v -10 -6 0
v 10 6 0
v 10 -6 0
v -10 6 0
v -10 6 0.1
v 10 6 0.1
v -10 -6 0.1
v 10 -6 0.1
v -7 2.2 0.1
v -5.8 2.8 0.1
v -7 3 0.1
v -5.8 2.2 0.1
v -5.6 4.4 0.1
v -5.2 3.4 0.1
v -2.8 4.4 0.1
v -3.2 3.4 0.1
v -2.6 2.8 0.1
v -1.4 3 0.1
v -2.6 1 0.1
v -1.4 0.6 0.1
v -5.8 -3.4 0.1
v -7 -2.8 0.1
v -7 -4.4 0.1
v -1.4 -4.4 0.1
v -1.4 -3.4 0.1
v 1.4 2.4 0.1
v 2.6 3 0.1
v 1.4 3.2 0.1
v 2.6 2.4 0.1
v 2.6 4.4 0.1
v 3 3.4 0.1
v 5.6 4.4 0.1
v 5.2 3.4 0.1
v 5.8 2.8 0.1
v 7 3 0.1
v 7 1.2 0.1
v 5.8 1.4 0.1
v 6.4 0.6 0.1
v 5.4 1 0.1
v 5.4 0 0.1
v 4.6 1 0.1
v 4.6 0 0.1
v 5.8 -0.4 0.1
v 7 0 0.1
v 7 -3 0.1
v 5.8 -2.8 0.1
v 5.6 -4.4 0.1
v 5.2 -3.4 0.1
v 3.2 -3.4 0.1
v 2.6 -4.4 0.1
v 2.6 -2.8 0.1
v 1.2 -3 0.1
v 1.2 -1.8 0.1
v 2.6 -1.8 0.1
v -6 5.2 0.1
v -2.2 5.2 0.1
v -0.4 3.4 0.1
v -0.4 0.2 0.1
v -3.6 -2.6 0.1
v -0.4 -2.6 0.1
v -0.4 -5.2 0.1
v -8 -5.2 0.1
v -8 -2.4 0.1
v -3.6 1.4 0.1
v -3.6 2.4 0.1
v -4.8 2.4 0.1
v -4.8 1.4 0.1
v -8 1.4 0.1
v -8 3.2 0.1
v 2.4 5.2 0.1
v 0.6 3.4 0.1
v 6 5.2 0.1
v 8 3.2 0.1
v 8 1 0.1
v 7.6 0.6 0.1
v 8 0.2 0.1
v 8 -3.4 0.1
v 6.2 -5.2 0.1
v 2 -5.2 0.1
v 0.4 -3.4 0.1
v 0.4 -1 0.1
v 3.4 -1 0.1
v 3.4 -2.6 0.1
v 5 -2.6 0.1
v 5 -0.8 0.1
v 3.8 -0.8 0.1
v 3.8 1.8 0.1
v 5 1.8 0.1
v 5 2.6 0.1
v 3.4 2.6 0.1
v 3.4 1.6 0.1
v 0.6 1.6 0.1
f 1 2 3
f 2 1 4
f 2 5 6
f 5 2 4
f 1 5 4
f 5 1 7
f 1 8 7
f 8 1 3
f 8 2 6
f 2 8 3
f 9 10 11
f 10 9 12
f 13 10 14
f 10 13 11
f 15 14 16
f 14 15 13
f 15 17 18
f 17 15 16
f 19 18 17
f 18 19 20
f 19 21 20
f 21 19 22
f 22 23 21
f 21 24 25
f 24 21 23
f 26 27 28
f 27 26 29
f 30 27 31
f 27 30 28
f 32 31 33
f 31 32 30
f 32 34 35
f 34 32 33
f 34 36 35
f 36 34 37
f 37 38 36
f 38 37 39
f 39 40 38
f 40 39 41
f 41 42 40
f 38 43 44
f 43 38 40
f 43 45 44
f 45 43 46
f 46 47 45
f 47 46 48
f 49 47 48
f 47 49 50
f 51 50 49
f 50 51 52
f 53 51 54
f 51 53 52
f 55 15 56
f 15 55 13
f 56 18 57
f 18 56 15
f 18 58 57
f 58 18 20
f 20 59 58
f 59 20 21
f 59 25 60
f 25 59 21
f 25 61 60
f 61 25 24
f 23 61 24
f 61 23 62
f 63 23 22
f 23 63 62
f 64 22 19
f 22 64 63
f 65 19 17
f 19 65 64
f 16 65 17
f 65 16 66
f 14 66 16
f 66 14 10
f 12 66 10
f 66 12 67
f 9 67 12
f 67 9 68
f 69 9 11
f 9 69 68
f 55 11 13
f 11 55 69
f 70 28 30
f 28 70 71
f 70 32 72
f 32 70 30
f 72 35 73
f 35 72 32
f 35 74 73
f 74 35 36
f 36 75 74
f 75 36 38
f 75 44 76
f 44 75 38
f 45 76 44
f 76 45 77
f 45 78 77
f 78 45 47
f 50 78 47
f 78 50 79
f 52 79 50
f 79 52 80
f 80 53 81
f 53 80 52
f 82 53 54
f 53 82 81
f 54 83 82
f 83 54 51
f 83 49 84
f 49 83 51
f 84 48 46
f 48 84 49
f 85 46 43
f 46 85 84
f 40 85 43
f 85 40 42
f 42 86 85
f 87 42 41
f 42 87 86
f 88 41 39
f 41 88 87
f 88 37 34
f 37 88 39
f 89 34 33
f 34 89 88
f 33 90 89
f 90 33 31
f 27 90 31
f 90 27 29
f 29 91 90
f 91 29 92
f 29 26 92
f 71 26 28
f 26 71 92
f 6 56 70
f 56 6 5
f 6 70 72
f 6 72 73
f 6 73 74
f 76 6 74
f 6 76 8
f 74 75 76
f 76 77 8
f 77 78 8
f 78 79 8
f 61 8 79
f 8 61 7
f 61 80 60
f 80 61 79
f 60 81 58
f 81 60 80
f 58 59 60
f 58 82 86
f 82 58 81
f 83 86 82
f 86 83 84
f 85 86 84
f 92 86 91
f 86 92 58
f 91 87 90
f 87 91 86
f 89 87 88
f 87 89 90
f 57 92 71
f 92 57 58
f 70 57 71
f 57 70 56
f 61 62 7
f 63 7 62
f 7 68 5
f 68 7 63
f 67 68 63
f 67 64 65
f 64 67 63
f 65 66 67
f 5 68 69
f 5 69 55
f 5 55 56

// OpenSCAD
// file: ../p/box5-12.scad
use <../lib.scad>
function ldraw_lib__box5_12() = [
// 0 Box with 5 Faces without Any Edges
// 0 Name: box5-12.dat
// 0 Author: Chris Dee [cwdee]
// 0 !LDRAW_ORG Primitive UPDATE 2009-02
// 0 !LICENSE Licensed under CC BY 2.0 and CC BY 4.0 : see CAreadme.txt
// 
// 0 BFC CERTIFY CCW
  [0,"BFC","CERTIFY"],
  [0,"BFC","CCW"],
// 
// 0 !HISTORY 2009-09-03 [PTadmin] Official Update 2009-02
// 
// 
// 4 16 1 1 1 1 1 -1 -1 1 -1 -1 1 1
  [4,16,1,1,1,1,1,-1,-1,1,-1,-1,1,1],
// 4 16 -1 0 1 1 0 1 1 1 1 -1 1 1
  [4,16,-1,0,1,1,0,1,1,1,1,-1,1,1],
// 4 16 -1 0 -1 -1 0 1 -1 1 1 -1 1 -1
  [4,16,-1,0,-1,-1,0,1,-1,1,1,-1,1,-1],
// 4 16 1 0 -1 -1 0 -1 -1 1 -1 1 1 -1
  [4,16,1,0,-1,-1,0,-1,-1,1,-1,1,1,-1],
// 4 16 1 0 1 1 0 -1 1 1 -1 1 1 1
  [4,16,1,0,1,1,0,-1,1,1,-1,1,1,1],
// 0
];
module ldraw_lib__box5_12(step=0, col=false, unit=2/5, alt=false, line=0.2, solid=!$preview)
    makepoly(ldraw_lib__box5_12(), step=step, col=col, unit=unit, alt=alt, line=line, solid=solid);
ldraw_lib__box5_12(line=0.2);
// main file
use <../lib.scad>
use <../p/box5-12.scad>
function ldraw_lib__162275f() = [
// 0 Sticker  1.5 x  2.5 with Black Outlined Yellow "23" on Transparent Background
// 0 Name: 162275f.dat
// 0 Author: Takeshi Takahashi [RainbowDolphin]
// 0 !LDRAW_ORG Part UPDATE 2022-06
// 0 !LICENSE Licensed under CC BY 2.0 and CC BY 4.0 : see CAreadme.txt
// 
// 0 BFC CERTIFY CCW
  [0,"BFC","CERTIFY"],
  [0,"BFC","CCW"],
// 
// 0 !KEYWORDS Bricklink 5550stk01, Brickowl 321461, Custom Rally Van, Model Team
// 0 !KEYWORDS Rebrickable 162275, Set 5550, truck
// 
// 0 !HISTORY 2022-12-20 [PTadmin] Official Update 2022-06
// 
// 
// 1 16 0 -0.25 0 25 0 0 0 0.25 0 0 0 15 box5-12.dat
  [1,16,0,-0.25,0,25,0,0,0,0.25,0,0,0,15, ldraw_lib__box5_12()],
// 0 BFC NOCLIP
  [0,"BFC","NOCLIP"],
// 4 14 -17.5 -0.25 7.5 -17.5 -0.25 5.5 -14.5 -0.25 5.5 -14.5 -0.25 7
  [4,14,-17.5,-0.25,7.5,-17.5,-0.25,5.5,-14.5,-0.25,5.5,-14.5,-0.25,7],
// 4 14 -14 -0.25 11 -17.5 -0.25 7.5 -14.5 -0.25 7 -13 -0.25 8.5
  [4,14,-14,-0.25,11,-17.5,-0.25,7.5,-14.5,-0.25,7,-13,-0.25,8.5],
// 4 14 -7 -0.25 11 -14 -0.25 11 -13 -0.25 8.5 -8 -0.25 8.5
  [4,14,-7,-0.25,11,-14,-0.25,11,-13,-0.25,8.5,-8,-0.25,8.5],
// 4 14 -3.5 -0.25 7.5 -7 -0.25 11 -8 -0.25 8.5 -6.5 -0.25 7
  [4,14,-3.5,-0.25,7.5,-7,-0.25,11,-8,-0.25,8.5,-6.5,-0.25,7],
// 4 14 -3.5 -0.25 7.5 -6.5 -0.25 7 -6.5 -0.25 2.5 -3.5 -0.25 1.5
  [4,14,-3.5,-0.25,7.5,-6.5,-0.25,7,-6.5,-0.25,2.5,-3.5,-0.25,1.5],
// 4 14 -14.5 -0.25 -8.5 -3.5 -0.25 1.5 -6.5 -0.25 2.5 -17.5 -0.25 -7
  [4,14,-14.5,-0.25,-8.5,-3.5,-0.25,1.5,-6.5,-0.25,2.5,-17.5,-0.25,-7],
// 3 14 -17.5 -0.25 -7 -17.5 -0.25 -11 -14.5 -0.25 -8.5
  [3,14,-17.5,-0.25,-7,-17.5,-0.25,-11,-14.5,-0.25,-8.5],
// 4 14 -14.5 -0.25 -8.5 -17.5 -0.25 -11 -3.5 -0.25 -11 -3.5 -0.25 -8.5
  [4,14,-14.5,-0.25,-8.5,-17.5,-0.25,-11,-3.5,-0.25,-11,-3.5,-0.25,-8.5],
// 4 14 3.5 -0.25 6 6.5 -0.25 6 6.5 -0.25 7.5 3.5 -0.25 8
  [4,14,3.5,-0.25,6,6.5,-0.25,6,6.5,-0.25,7.5,3.5,-0.25,8],
// 4 14 3.5 -0.25 8 6.5 -0.25 7.5 7.5 -0.25 8.5 6.5 -0.25 11
  [4,14,3.5,-0.25,8,6.5,-0.25,7.5,7.5,-0.25,8.5,6.5,-0.25,11],
// 4 14 14 -0.25 11 6.5 -0.25 11 7.5 -0.25 8.5 13 -0.25 8.5
  [4,14,14,-0.25,11,6.5,-0.25,11,7.5,-0.25,8.5,13,-0.25,8.5],
// 4 14 17.5 -0.25 7.5 14 -0.25 11 13 -0.25 8.5 14.5 -0.25 7
  [4,14,17.5,-0.25,7.5,14,-0.25,11,13,-0.25,8.5,14.5,-0.25,7],
// 4 14 17.5 -0.25 3 17.5 -0.25 7.5 14.5 -0.25 7 14.5 -0.25 3.5
  [4,14,17.5,-0.25,3,17.5,-0.25,7.5,14.5,-0.25,7,14.5,-0.25,3.5],
// 4 14 16 -0.25 1.5 17.5 -0.25 3 14.5 -0.25 3.5 13.5 -0.25 2.5
  [4,14,16,-0.25,1.5,17.5,-0.25,3,14.5,-0.25,3.5,13.5,-0.25,2.5],
// 4 14 13.5 -0.25 0 16 -0.25 1.5 13.5 -0.25 2.5 11.5 -0.25 2.5
  [4,14,13.5,-0.25,0,16,-0.25,1.5,13.5,-0.25,2.5,11.5,-0.25,2.5],
// 3 14 11.5 -0.25 2.5 11.5 -0.25 0 13.5 -0.25 0
  [3,14,11.5,-0.25,2.5,11.5,-0.25,0,13.5,-0.25,0],
// 4 14 16 -0.25 1.5 13.5 -0.25 0 14.5 -0.25 -1 17.5 -0.25 0
  [4,14,16,-0.25,1.5,13.5,-0.25,0,14.5,-0.25,-1,17.5,-0.25,0],
// 4 14 17.5 -0.25 -7.5 17.5 -0.25 0 14.5 -0.25 -1 14.5 -0.25 -7
  [4,14,17.5,-0.25,-7.5,17.5,-0.25,0,14.5,-0.25,-1,14.5,-0.25,-7],
// 4 14 14 -0.25 -11 17.5 -0.25 -7.5 14.5 -0.25 -7 13 -0.25 -8.5
  [4,14,14,-0.25,-11,17.5,-0.25,-7.5,14.5,-0.25,-7,13,-0.25,-8.5],
// 4 14 6.5 -0.25 -11 14 -0.25 -11 13 -0.25 -8.5 8 -0.25 -8.5
  [4,14,6.5,-0.25,-11,14,-0.25,-11,13,-0.25,-8.5,8,-0.25,-8.5],
// 4 14 3 -0.25 -7.5 6.5 -0.25 -11 8 -0.25 -8.5 6.5 -0.25 -7
  [4,14,3,-0.25,-7.5,6.5,-0.25,-11,8,-0.25,-8.5,6.5,-0.25,-7],
// 4 14 3 -0.25 -4.5 3 -0.25 -7.5 6.5 -0.25 -7 6.5 -0.25 -4.5
  [4,14,3,-0.25,-4.5,3,-0.25,-7.5,6.5,-0.25,-7,6.5,-0.25,-4.5],
// 4 0 -15 -0.25 13 -14 -0.25 11 -7 -0.25 11 -5.5 -0.25 13
  [4,0,-15,-0.25,13,-14,-0.25,11,-7,-0.25,11,-5.5,-0.25,13],
// 4 0 -1 -0.25 8.5 -5.5 -0.25 13 -7 -0.25 11 -3.5 -0.25 7.5
  [4,0,-1,-0.25,8.5,-5.5,-0.25,13,-7,-0.25,11,-3.5,-0.25,7.5],
// 4 0 -1 -0.25 8.5 -3.5 -0.25 7.5 -3.5 -0.25 1.5 -1 -0.25 0.5
  [4,0,-1,-0.25,8.5,-3.5,-0.25,7.5,-3.5,-0.25,1.5,-1,-0.25,0.5],
// 4 0 -9 -0.25 -6.5 -1 -0.25 0.5 -3.5 -0.25 1.5 -14.5 -0.25 -8.5
  [4,0,-9,-0.25,-6.5,-1,-0.25,0.5,-3.5,-0.25,1.5,-14.5,-0.25,-8.5],
// 4 0 -9 -0.25 -6.5 -14.5 -0.25 -8.5 -3.5 -0.25 -8.5 -1 -0.25 -6.5
  [4,0,-9,-0.25,-6.5,-14.5,-0.25,-8.5,-3.5,-0.25,-8.5,-1,-0.25,-6.5],
// 4 0 -1 -0.25 -13 -1 -0.25 -6.5 -3.5 -0.25 -8.5 -3.5 -0.25 -11
  [4,0,-1,-0.25,-13,-1,-0.25,-6.5,-3.5,-0.25,-8.5,-3.5,-0.25,-11],
// 4 0 -20 -0.25 -13 -1 -0.25 -13 -3.5 -0.25 -11 -17.5 -0.25 -11
  [4,0,-20,-0.25,-13,-1,-0.25,-13,-3.5,-0.25,-11,-17.5,-0.25,-11],
// 4 0 -20 -0.25 -6 -20 -0.25 -13 -17.5 -0.25 -11 -17.5 -0.25 -7
  [4,0,-20,-0.25,-6,-20,-0.25,-13,-17.5,-0.25,-11,-17.5,-0.25,-7],
// 4 0 -9 -0.25 3.5 -20 -0.25 -6 -17.5 -0.25 -7 -6.5 -0.25 2.5
  [4,0,-9,-0.25,3.5,-20,-0.25,-6,-17.5,-0.25,-7,-6.5,-0.25,2.5],
// 4 0 -9 -0.25 3.5 -6.5 -0.25 2.5 -6.5 -0.25 7 -9 -0.25 6
  [4,0,-9,-0.25,3.5,-6.5,-0.25,2.5,-6.5,-0.25,7,-9,-0.25,6],
// 4 0 -9 -0.25 6 -6.5 -0.25 7 -8 -0.25 8.5 -12 -0.25 6
  [4,0,-9,-0.25,6,-6.5,-0.25,7,-8,-0.25,8.5,-12,-0.25,6],
// 4 0 -12 -0.25 6 -8 -0.25 8.5 -13 -0.25 8.5 -14.5 -0.25 7
  [4,0,-12,-0.25,6,-8,-0.25,8.5,-13,-0.25,8.5,-14.5,-0.25,7],
// 4 0 -12 -0.25 6 -14.5 -0.25 7 -14.5 -0.25 5.5 -12 -0.25 3.5
  [4,0,-12,-0.25,6,-14.5,-0.25,7,-14.5,-0.25,5.5,-12,-0.25,3.5],
// 4 0 -20 -0.25 3.5 -12 -0.25 3.5 -14.5 -0.25 5.5 -17.5 -0.25 5.5
  [4,0,-20,-0.25,3.5,-12,-0.25,3.5,-14.5,-0.25,5.5,-17.5,-0.25,5.5],
// 4 0 -20 -0.25 8 -20 -0.25 3.5 -17.5 -0.25 5.5 -17.5 -0.25 7.5
  [4,0,-20,-0.25,8,-20,-0.25,3.5,-17.5,-0.25,5.5,-17.5,-0.25,7.5],
// 4 0 -15 -0.25 13 -20 -0.25 8 -17.5 -0.25 7.5 -14 -0.25 11
  [4,0,-15,-0.25,13,-20,-0.25,8,-17.5,-0.25,7.5,-14,-0.25,11],
// 4 0 1.5 -0.25 8.5 3.5 -0.25 8 6.5 -0.25 11 6 -0.25 13
  [4,0,1.5,-0.25,8.5,3.5,-0.25,8,6.5,-0.25,11,6,-0.25,13],
// 4 0 6 -0.25 13 6.5 -0.25 11 14 -0.25 11 15 -0.25 13
  [4,0,6,-0.25,13,6.5,-0.25,11,14,-0.25,11,15,-0.25,13],
// 4 0 20 -0.25 8 15 -0.25 13 14 -0.25 11 17.5 -0.25 7.5
  [4,0,20,-0.25,8,15,-0.25,13,14,-0.25,11,17.5,-0.25,7.5],
// 4 0 20 -0.25 2.5 20 -0.25 8 17.5 -0.25 7.5 17.5 -0.25 3
  [4,0,20,-0.25,2.5,20,-0.25,8,17.5,-0.25,7.5,17.5,-0.25,3],
// 4 0 19 -0.25 1.5 20 -0.25 2.5 17.5 -0.25 3 16 -0.25 1.5
  [4,0,19,-0.25,1.5,20,-0.25,2.5,17.5,-0.25,3,16,-0.25,1.5],
// 4 0 19 -0.25 1.5 16 -0.25 1.5 17.5 -0.25 0 20 -0.25 0.5
  [4,0,19,-0.25,1.5,16,-0.25,1.5,17.5,-0.25,0,20,-0.25,0.5],
// 4 0 20 -0.25 0.5 17.5 -0.25 0 17.5 -0.25 -7.5 20 -0.25 -8.5
  [4,0,20,-0.25,0.5,17.5,-0.25,0,17.5,-0.25,-7.5,20,-0.25,-8.5],
// 4 0 20 -0.25 -8.5 17.5 -0.25 -7.5 14 -0.25 -11 15.5 -0.25 -13
  [4,0,20,-0.25,-8.5,17.5,-0.25,-7.5,14,-0.25,-11,15.5,-0.25,-13],
// 4 0 15.5 -0.25 -13 14 -0.25 -11 6.5 -0.25 -11 5 -0.25 -13
  [4,0,15.5,-0.25,-13,14,-0.25,-11,6.5,-0.25,-11,5,-0.25,-13],
// 4 0 5 -0.25 -13 6.5 -0.25 -11 3 -0.25 -7.5 1 -0.25 -8.5
  [4,0,5,-0.25,-13,6.5,-0.25,-11,3,-0.25,-7.5,1,-0.25,-8.5],
// 4 0 1 -0.25 -8.5 3 -0.25 -7.5 3 -0.25 -4.5 1 -0.25 -2.5
  [4,0,1,-0.25,-8.5,3,-0.25,-7.5,3,-0.25,-4.5,1,-0.25,-2.5],
// 4 0 1 -0.25 -2.5 3 -0.25 -4.5 6.5 -0.25 -4.5 8.5 -0.25 -2.5
  [4,0,1,-0.25,-2.5,3,-0.25,-4.5,6.5,-0.25,-4.5,8.5,-0.25,-2.5],
// 4 0 8.5 -0.25 -6.5 8.5 -0.25 -2.5 6.5 -0.25 -4.5 6.5 -0.25 -7
  [4,0,8.5,-0.25,-6.5,8.5,-0.25,-2.5,6.5,-0.25,-4.5,6.5,-0.25,-7],
// 4 0 8.5 -0.25 -6.5 6.5 -0.25 -7 8 -0.25 -8.5 12.5 -0.25 -6.5
  [4,0,8.5,-0.25,-6.5,6.5,-0.25,-7,8,-0.25,-8.5,12.5,-0.25,-6.5],
// 4 0 12.5 -0.25 -6.5 8 -0.25 -8.5 13 -0.25 -8.5 14.5 -0.25 -7
  [4,0,12.5,-0.25,-6.5,8,-0.25,-8.5,13,-0.25,-8.5,14.5,-0.25,-7],
// 4 0 12.5 -0.25 -6.5 14.5 -0.25 -7 14.5 -0.25 -1 12.5 -0.25 -2
  [4,0,12.5,-0.25,-6.5,14.5,-0.25,-7,14.5,-0.25,-1,12.5,-0.25,-2],
// 4 0 12.5 -0.25 -2 14.5 -0.25 -1 13.5 -0.25 0 11.5 -0.25 0
  [4,0,12.5,-0.25,-2,14.5,-0.25,-1,13.5,-0.25,0,11.5,-0.25,0],
// 3 0 11.5 -0.25 0 9.5 -0.25 -2 12.5 -0.25 -2
  [3,0,11.5,-0.25,0,9.5,-0.25,-2,12.5,-0.25,-2],
// 4 0 9.5 -0.25 4.5 9.5 -0.25 -2 11.5 -0.25 0 11.5 -0.25 2.5
  [4,0,9.5,-0.25,4.5,9.5,-0.25,-2,11.5,-0.25,0,11.5,-0.25,2.5],
// 4 0 12.5 -0.25 4.5 9.5 -0.25 4.5 11.5 -0.25 2.5 13.5 -0.25 2.5
  [4,0,12.5,-0.25,4.5,9.5,-0.25,4.5,11.5,-0.25,2.5,13.5,-0.25,2.5],
// 4 0 12.5 -0.25 4.5 13.5 -0.25 2.5 14.5 -0.25 3.5 14.5 -0.25 7
  [4,0,12.5,-0.25,4.5,13.5,-0.25,2.5,14.5,-0.25,3.5,14.5,-0.25,7],
// 4 0 12.5 -0.25 6.5 12.5 -0.25 4.5 14.5 -0.25 7 13 -0.25 8.5
  [4,0,12.5,-0.25,6.5,12.5,-0.25,4.5,14.5,-0.25,7,13,-0.25,8.5],
// 4 0 12.5 -0.25 6.5 13 -0.25 8.5 7.5 -0.25 8.5 8.5 -0.25 6.5
  [4,0,12.5,-0.25,6.5,13,-0.25,8.5,7.5,-0.25,8.5,8.5,-0.25,6.5],
// 4 0 8.5 -0.25 6.5 7.5 -0.25 8.5 6.5 -0.25 7.5 6.5 -0.25 6
  [4,0,8.5,-0.25,6.5,7.5,-0.25,8.5,6.5,-0.25,7.5,6.5,-0.25,6],
// 4 0 8.5 -0.25 4 8.5 -0.25 6.5 6.5 -0.25 6 1.5 -0.25 4
  [4,0,8.5,-0.25,4,8.5,-0.25,6.5,6.5,-0.25,6,1.5,-0.25,4],
// 3 0 6.5 -0.25 6 3.5 -0.25 6 1.5 -0.25 4
  [3,0,6.5,-0.25,6,3.5,-0.25,6,1.5,-0.25,4],
// 4 0 1.5 -0.25 8.5 1.5 -0.25 4 3.5 -0.25 6 3.5 -0.25 8
  [4,0,1.5,-0.25,8.5,1.5,-0.25,4,3.5,-0.25,6,3.5,-0.25,8],
// 0 BFC CLIP
  [0,"BFC","CLIP"],
// 4 16 25 -0.25 15 -25 -0.25 15 -5.5 -0.25 13 6 -0.25 13
  [4,16,25,-0.25,15,-25,-0.25,15,-5.5,-0.25,13,6,-0.25,13],
// 3 16 25 -0.25 15 6 -0.25 13 15 -0.25 13
  [3,16,25,-0.25,15,6,-0.25,13,15,-0.25,13],
// 3 16 25 -0.25 15 15 -0.25 13 20 -0.25 8
  [3,16,25,-0.25,15,15,-0.25,13,20,-0.25,8],
// 3 16 25 -0.25 15 20 -0.25 8 20 -0.25 2.5
  [3,16,25,-0.25,15,20,-0.25,8,20,-0.25,2.5],
// 4 16 25 -0.25 15 20 -0.25 2.5 20 -0.25 0.5 25 -0.25 -15
  [4,16,25,-0.25,15,20,-0.25,2.5,20,-0.25,0.5,25,-0.25,-15],
// 3 16 20 -0.25 2.5 19 -0.25 1.5 20 -0.25 0.5
  [3,16,20,-0.25,2.5,19,-0.25,1.5,20,-0.25,0.5],
// 3 16 20 -0.25 0.5 20 -0.25 -8.5 25 -0.25 -15
  [3,16,20,-0.25,0.5,20,-0.25,-8.5,25,-0.25,-15],
// 3 16 20 -0.25 -8.5 15.5 -0.25 -13 25 -0.25 -15
  [3,16,20,-0.25,-8.5,15.5,-0.25,-13,25,-0.25,-15],
// 3 16 15.5 -0.25 -13 5 -0.25 -13 25 -0.25 -15
  [3,16,15.5,-0.25,-13,5,-0.25,-13,25,-0.25,-15],
// 4 16 25 -0.25 -15 5 -0.25 -13 -1 -0.25 -13 -25 -0.25 -15
  [4,16,25,-0.25,-15,5,-0.25,-13,-1,-0.25,-13,-25,-0.25,-15],
// 4 16 -1 -0.25 -13 5 -0.25 -13 1 -0.25 -8.5 -1 -0.25 -6.5
  [4,16,-1,-0.25,-13,5,-0.25,-13,1,-0.25,-8.5,-1,-0.25,-6.5],
// 4 16 -1 -0.25 -6.5 1 -0.25 -8.5 1 -0.25 -2.5 -1 -0.25 0.5
  [4,16,-1,-0.25,-6.5,1,-0.25,-8.5,1,-0.25,-2.5,-1,-0.25,0.5],
// 3 16 -1 -0.25 0.5 -9 -0.25 -6.5 -1 -0.25 -6.5
  [3,16,-1,-0.25,0.5,-9,-0.25,-6.5,-1,-0.25,-6.5],
// 4 16 -1 -0.25 0.5 1 -0.25 -2.5 8.5 -0.25 -2.5 9.5 -0.25 -2
  [4,16,-1,-0.25,0.5,1,-0.25,-2.5,8.5,-0.25,-2.5,9.5,-0.25,-2],
// 4 16 9.5 -0.25 -2 8.5 -0.25 -2.5 8.5 -0.25 -6.5 12.5 -0.25 -6.5
  [4,16,9.5,-0.25,-2,8.5,-0.25,-2.5,8.5,-0.25,-6.5,12.5,-0.25,-6.5],
// 3 16 12.5 -0.25 -2 9.5 -0.25 -2 12.5 -0.25 -6.5
  [3,16,12.5,-0.25,-2,9.5,-0.25,-2,12.5,-0.25,-6.5],
// 4 16 -1 -0.25 0.5 9.5 -0.25 -2 8.5 -0.25 4 1.5 -0.25 4
  [4,16,-1,-0.25,0.5,9.5,-0.25,-2,8.5,-0.25,4,1.5,-0.25,4],
// 4 16 8.5 -0.25 4 9.5 -0.25 -2 9.5 -0.25 4.5 8.5 -0.25 6.5
  [4,16,8.5,-0.25,4,9.5,-0.25,-2,9.5,-0.25,4.5,8.5,-0.25,6.5],
// 4 16 12.5 -0.25 6.5 8.5 -0.25 6.5 9.5 -0.25 4.5 12.5 -0.25 4.5
  [4,16,12.5,-0.25,6.5,8.5,-0.25,6.5,9.5,-0.25,4.5,12.5,-0.25,4.5],
// 4 16 -1 -0.25 8.5 -1 -0.25 0.5 1.5 -0.25 4 1.5 -0.25 8.5
  [4,16,-1,-0.25,8.5,-1,-0.25,0.5,1.5,-0.25,4,1.5,-0.25,8.5],
// 4 16 -5.5 -0.25 13 -1 -0.25 8.5 1.5 -0.25 8.5 6 -0.25 13
  [4,16,-5.5,-0.25,13,-1,-0.25,8.5,1.5,-0.25,8.5,6,-0.25,13],
// 3 16 -1 -0.25 -13 -20 -0.25 -13 -25 -0.25 -15
  [3,16,-1,-0.25,-13,-20,-0.25,-13,-25,-0.25,-15],
// 3 16 -20 -0.25 -6 -25 -0.25 -15 -20 -0.25 -13
  [3,16,-20,-0.25,-6,-25,-0.25,-15,-20,-0.25,-13],
// 4 16 -25 -0.25 -15 -20 -0.25 -6 -20 -0.25 3.5 -25 -0.25 15
  [4,16,-25,-0.25,-15,-20,-0.25,-6,-20,-0.25,3.5,-25,-0.25,15],
// 3 16 -12 -0.25 3.5 -20 -0.25 3.5 -20 -0.25 -6
  [3,16,-12,-0.25,3.5,-20,-0.25,3.5,-20,-0.25,-6],
// 4 16 -12 -0.25 3.5 -20 -0.25 -6 -9 -0.25 3.5 -9 -0.25 6
  [4,16,-12,-0.25,3.5,-20,-0.25,-6,-9,-0.25,3.5,-9,-0.25,6],
// 3 16 -9 -0.25 6 -12 -0.25 6 -12 -0.25 3.5
  [3,16,-9,-0.25,6,-12,-0.25,6,-12,-0.25,3.5],
// 3 16 -25 -0.25 15 -20 -0.25 3.5 -20 -0.25 8
  [3,16,-25,-0.25,15,-20,-0.25,3.5,-20,-0.25,8],
// 3 16 -25 -0.25 15 -20 -0.25 8 -15 -0.25 13
  [3,16,-25,-0.25,15,-20,-0.25,8,-15,-0.25,13],
// 3 16 -25 -0.25 15 -15 -0.25 13 -5.5 -0.25 13
  [3,16,-25,-0.25,15,-15,-0.25,13,-5.5,-0.25,13],
];
module ldraw_lib__162275f(step=0, col=false, unit=2/5, alt=false, line=0.2, solid=!$preview)
    makepoly(ldraw_lib__162275f(), step=step, col=col, unit=unit, alt=alt, line=line, solid=solid);
ldraw_lib__162275f(line=0.2);
